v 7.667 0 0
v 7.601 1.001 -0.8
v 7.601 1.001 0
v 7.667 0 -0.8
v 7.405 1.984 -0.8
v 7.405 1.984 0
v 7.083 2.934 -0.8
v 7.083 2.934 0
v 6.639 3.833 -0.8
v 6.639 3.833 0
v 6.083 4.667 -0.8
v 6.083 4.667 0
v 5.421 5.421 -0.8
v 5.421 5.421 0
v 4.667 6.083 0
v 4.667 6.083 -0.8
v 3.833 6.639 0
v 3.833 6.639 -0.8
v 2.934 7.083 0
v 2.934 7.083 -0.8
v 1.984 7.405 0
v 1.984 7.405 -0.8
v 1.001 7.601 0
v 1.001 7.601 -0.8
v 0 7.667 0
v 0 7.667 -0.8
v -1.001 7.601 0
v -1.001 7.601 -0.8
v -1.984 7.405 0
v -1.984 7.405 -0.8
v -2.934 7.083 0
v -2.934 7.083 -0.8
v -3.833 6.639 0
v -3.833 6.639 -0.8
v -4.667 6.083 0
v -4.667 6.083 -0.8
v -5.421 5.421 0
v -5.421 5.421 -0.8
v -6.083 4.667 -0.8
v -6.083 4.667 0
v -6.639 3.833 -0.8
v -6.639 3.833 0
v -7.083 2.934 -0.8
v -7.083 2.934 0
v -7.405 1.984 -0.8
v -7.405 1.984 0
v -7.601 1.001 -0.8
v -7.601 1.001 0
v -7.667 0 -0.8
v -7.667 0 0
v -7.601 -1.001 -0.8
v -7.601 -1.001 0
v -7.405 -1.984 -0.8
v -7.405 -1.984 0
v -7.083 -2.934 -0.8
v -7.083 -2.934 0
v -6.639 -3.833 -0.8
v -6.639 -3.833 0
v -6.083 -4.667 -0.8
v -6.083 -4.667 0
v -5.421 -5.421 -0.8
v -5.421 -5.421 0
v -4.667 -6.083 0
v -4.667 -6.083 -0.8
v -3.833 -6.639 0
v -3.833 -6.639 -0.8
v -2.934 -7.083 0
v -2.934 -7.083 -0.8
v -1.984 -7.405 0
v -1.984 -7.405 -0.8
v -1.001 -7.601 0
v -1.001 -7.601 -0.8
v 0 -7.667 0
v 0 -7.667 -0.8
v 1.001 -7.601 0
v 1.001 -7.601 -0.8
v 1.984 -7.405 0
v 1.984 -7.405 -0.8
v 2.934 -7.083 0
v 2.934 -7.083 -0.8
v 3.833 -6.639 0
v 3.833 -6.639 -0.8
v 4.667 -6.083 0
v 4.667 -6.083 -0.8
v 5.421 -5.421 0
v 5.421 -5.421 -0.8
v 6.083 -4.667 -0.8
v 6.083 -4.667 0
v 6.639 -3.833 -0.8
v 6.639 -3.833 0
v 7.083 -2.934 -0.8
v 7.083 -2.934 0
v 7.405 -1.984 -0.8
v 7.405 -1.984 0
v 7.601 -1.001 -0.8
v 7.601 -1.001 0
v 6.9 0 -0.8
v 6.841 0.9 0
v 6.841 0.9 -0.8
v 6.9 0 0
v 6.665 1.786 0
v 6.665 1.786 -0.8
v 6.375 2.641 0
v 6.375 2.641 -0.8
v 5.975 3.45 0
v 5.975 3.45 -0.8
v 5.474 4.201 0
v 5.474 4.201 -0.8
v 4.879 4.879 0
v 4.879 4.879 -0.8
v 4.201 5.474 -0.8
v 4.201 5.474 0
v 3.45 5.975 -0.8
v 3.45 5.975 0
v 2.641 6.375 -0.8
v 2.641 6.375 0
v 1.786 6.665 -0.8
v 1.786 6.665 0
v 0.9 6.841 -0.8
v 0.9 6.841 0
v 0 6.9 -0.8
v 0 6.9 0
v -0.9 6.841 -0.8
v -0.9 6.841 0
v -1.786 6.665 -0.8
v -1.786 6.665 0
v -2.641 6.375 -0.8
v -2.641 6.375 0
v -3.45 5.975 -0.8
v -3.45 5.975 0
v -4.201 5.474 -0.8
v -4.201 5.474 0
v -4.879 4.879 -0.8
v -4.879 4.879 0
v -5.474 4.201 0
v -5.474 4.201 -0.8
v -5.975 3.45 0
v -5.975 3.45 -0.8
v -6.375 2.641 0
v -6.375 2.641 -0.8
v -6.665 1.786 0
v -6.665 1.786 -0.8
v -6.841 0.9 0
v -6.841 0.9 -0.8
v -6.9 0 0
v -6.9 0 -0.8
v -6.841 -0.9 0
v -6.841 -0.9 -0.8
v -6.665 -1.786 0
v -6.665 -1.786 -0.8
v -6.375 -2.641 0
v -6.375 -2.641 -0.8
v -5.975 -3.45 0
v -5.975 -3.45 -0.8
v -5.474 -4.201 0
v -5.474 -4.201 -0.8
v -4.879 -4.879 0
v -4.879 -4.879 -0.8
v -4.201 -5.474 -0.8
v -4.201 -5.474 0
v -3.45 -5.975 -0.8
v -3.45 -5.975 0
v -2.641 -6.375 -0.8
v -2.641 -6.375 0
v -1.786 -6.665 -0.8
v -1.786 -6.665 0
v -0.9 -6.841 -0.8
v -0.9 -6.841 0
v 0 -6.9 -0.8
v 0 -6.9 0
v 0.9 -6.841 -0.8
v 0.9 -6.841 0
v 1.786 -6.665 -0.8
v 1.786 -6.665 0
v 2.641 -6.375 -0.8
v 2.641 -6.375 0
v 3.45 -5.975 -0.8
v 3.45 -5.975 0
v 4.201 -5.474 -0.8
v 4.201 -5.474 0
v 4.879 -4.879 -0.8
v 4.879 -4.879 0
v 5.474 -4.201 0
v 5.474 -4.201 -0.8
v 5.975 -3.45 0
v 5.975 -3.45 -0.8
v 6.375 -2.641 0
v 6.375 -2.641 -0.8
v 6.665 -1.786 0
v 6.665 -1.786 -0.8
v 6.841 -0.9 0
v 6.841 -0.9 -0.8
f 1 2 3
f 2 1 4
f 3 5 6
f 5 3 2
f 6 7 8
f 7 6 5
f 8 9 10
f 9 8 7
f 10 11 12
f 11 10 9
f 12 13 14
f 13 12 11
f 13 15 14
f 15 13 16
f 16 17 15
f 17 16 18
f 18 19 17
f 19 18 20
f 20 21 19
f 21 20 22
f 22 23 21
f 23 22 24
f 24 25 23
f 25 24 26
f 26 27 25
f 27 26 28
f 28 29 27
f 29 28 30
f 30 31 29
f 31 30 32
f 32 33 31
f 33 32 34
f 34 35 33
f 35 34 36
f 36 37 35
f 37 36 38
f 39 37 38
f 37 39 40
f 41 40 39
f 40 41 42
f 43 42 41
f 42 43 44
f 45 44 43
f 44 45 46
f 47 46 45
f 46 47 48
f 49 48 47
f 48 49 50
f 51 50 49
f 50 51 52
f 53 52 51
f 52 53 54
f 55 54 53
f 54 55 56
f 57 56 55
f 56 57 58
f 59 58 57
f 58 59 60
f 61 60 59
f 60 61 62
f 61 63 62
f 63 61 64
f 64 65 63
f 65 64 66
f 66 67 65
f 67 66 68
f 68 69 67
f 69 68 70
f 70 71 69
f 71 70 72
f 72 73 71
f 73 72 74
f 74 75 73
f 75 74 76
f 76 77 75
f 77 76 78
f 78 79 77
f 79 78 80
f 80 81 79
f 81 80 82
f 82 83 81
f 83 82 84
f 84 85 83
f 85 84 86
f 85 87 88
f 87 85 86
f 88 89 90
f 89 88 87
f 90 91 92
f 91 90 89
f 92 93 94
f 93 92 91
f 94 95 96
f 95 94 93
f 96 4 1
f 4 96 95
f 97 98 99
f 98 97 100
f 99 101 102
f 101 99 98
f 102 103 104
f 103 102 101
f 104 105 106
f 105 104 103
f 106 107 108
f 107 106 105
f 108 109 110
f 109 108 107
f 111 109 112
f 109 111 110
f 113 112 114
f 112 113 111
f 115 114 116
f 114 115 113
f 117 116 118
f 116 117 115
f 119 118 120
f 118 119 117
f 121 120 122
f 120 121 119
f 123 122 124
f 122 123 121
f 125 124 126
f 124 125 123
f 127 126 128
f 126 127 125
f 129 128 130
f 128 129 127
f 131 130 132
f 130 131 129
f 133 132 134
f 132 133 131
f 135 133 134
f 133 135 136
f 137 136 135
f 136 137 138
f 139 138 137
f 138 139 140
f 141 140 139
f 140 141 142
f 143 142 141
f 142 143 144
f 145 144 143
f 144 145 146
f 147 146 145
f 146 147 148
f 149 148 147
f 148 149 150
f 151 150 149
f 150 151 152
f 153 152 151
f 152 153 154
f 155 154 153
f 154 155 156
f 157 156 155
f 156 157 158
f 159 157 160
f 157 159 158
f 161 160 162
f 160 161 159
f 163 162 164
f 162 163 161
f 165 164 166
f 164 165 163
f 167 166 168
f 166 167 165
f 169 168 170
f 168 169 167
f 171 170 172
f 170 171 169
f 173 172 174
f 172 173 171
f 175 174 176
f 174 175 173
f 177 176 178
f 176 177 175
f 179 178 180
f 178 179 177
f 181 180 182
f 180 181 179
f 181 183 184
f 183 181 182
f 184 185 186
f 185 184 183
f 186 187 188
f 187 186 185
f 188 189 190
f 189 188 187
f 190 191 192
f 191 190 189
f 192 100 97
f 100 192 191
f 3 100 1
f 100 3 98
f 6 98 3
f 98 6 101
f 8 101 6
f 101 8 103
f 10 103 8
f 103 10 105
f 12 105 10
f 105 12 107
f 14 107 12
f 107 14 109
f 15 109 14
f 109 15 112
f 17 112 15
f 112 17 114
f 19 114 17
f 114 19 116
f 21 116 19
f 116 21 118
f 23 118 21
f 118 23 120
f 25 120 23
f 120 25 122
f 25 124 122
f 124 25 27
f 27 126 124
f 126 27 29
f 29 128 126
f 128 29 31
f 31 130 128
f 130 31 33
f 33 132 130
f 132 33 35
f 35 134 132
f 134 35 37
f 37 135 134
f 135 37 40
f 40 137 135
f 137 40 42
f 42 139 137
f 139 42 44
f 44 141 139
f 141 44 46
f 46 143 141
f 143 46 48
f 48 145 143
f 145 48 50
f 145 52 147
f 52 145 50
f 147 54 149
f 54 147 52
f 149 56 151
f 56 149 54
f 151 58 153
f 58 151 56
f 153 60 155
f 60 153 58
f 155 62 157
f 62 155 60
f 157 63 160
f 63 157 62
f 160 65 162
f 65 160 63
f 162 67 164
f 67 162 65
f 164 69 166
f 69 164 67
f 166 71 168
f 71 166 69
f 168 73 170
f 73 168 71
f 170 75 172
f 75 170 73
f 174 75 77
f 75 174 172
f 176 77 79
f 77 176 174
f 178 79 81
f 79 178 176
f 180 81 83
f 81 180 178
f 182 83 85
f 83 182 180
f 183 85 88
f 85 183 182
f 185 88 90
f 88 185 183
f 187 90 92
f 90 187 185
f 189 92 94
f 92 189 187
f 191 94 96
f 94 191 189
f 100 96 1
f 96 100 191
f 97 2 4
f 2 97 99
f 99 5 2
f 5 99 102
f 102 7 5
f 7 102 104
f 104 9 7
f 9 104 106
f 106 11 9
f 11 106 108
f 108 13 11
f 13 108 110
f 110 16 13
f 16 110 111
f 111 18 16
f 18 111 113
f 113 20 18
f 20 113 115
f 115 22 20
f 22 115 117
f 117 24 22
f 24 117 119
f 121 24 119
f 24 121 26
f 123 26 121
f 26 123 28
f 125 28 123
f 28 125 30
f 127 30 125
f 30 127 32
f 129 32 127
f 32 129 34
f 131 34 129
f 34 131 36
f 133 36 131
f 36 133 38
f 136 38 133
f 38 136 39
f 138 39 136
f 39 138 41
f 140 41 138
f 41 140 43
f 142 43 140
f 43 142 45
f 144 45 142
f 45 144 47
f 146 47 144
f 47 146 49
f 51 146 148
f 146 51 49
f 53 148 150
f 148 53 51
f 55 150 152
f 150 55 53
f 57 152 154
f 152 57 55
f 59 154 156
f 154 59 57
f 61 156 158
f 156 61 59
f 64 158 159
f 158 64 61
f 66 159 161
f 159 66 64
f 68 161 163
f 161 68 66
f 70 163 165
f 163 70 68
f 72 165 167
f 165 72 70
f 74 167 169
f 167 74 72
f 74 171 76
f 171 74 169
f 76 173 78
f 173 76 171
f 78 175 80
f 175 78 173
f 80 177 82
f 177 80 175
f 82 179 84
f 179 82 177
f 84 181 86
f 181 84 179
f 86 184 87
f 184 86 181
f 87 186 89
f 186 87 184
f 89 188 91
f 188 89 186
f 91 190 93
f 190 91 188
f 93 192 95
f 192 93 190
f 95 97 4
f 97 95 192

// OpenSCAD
use <../lib.scad>
use <../p/48/4-4cylo.scad>
use <../p/48/4-4ring9.scad>
$fa=1; $fs=0.2;
function ldraw_lib__u9395(realsolid=false) = [
// 0 ~Electric Powered Up 6 Port Hub On Button Lighting Ring
// 0 Name: u9395.dat
// 0 Author: Philippe Hurbain [Philo]
// 0 !LDRAW_ORG Part UPDATE 2020-03
// 0 !LICENSE Licensed under CC BY 2.0 and CC BY 4.0 : see CAreadme.txt
// 
// 0 BFC CERTIFY CCW
  [0,"BFC","CERTIFY"],
  [0,"BFC","CCW"],
// 
// 0 !KEYWORDS Mindstorms, Robot Inventor, Spike Prime
// 
// 0 !HISTORY 2019-12-27 [PTadmin] Official Update 2019-03
// 0 !HISTORY 2020-12-27 [PTadmin] Update description
// 0 !HISTORY 2020-12-29 [PTadmin] Official Update 2020-03
// 
// 
// 1 16 0 0 0 19.16667 0 0 0 2 0 0 0 19.16667 48\4-4cylo.dat
  [1,16,0,0,0,19.16667,0,0,0,2,0,0,0,19.16667, ldraw_lib__48__4_4cylo(realsolid)],
// 0 BFC INVERTNEXT
  [0,"BFC","INVERTNEXT"],
// 1 16 0 0 0 17.25 0 0 0 2 0 0 0 17.25 48\4-4cylo.dat
  [1,16,0,0,0,17.25,0,0,0,2,0,0,0,17.25, ldraw_lib__48__4_4cylo(realsolid)],
// 1 16 0 0 0 1.91667 0 0 0 1 0 0 0 1.91667 48\4-4ring9.dat
  [1,16,0,0,0,1.91667,0,0,0,1,0,0,0,1.91667, ldraw_lib__48__4_4ring9(realsolid)],
// 1 16 0 2 0 1.91667 0 0 0 -1 0 0 0 1.91667 48\4-4ring9.dat
  [1,16,0,2,0,1.91667,0,0,0,-1,0,0,0,1.91667, ldraw_lib__48__4_4ring9(realsolid)],
];
module ldraw_lib__u9395(step=0, col=false, unit=2/5, alt=false, line=0.2, solid=!$preview)
    makepoly(ldraw_lib__u9395(solid), step=step, col=col, unit=unit, alt=alt, line=line, solid=solid);
ldraw_lib__u9395(line=0.2);
